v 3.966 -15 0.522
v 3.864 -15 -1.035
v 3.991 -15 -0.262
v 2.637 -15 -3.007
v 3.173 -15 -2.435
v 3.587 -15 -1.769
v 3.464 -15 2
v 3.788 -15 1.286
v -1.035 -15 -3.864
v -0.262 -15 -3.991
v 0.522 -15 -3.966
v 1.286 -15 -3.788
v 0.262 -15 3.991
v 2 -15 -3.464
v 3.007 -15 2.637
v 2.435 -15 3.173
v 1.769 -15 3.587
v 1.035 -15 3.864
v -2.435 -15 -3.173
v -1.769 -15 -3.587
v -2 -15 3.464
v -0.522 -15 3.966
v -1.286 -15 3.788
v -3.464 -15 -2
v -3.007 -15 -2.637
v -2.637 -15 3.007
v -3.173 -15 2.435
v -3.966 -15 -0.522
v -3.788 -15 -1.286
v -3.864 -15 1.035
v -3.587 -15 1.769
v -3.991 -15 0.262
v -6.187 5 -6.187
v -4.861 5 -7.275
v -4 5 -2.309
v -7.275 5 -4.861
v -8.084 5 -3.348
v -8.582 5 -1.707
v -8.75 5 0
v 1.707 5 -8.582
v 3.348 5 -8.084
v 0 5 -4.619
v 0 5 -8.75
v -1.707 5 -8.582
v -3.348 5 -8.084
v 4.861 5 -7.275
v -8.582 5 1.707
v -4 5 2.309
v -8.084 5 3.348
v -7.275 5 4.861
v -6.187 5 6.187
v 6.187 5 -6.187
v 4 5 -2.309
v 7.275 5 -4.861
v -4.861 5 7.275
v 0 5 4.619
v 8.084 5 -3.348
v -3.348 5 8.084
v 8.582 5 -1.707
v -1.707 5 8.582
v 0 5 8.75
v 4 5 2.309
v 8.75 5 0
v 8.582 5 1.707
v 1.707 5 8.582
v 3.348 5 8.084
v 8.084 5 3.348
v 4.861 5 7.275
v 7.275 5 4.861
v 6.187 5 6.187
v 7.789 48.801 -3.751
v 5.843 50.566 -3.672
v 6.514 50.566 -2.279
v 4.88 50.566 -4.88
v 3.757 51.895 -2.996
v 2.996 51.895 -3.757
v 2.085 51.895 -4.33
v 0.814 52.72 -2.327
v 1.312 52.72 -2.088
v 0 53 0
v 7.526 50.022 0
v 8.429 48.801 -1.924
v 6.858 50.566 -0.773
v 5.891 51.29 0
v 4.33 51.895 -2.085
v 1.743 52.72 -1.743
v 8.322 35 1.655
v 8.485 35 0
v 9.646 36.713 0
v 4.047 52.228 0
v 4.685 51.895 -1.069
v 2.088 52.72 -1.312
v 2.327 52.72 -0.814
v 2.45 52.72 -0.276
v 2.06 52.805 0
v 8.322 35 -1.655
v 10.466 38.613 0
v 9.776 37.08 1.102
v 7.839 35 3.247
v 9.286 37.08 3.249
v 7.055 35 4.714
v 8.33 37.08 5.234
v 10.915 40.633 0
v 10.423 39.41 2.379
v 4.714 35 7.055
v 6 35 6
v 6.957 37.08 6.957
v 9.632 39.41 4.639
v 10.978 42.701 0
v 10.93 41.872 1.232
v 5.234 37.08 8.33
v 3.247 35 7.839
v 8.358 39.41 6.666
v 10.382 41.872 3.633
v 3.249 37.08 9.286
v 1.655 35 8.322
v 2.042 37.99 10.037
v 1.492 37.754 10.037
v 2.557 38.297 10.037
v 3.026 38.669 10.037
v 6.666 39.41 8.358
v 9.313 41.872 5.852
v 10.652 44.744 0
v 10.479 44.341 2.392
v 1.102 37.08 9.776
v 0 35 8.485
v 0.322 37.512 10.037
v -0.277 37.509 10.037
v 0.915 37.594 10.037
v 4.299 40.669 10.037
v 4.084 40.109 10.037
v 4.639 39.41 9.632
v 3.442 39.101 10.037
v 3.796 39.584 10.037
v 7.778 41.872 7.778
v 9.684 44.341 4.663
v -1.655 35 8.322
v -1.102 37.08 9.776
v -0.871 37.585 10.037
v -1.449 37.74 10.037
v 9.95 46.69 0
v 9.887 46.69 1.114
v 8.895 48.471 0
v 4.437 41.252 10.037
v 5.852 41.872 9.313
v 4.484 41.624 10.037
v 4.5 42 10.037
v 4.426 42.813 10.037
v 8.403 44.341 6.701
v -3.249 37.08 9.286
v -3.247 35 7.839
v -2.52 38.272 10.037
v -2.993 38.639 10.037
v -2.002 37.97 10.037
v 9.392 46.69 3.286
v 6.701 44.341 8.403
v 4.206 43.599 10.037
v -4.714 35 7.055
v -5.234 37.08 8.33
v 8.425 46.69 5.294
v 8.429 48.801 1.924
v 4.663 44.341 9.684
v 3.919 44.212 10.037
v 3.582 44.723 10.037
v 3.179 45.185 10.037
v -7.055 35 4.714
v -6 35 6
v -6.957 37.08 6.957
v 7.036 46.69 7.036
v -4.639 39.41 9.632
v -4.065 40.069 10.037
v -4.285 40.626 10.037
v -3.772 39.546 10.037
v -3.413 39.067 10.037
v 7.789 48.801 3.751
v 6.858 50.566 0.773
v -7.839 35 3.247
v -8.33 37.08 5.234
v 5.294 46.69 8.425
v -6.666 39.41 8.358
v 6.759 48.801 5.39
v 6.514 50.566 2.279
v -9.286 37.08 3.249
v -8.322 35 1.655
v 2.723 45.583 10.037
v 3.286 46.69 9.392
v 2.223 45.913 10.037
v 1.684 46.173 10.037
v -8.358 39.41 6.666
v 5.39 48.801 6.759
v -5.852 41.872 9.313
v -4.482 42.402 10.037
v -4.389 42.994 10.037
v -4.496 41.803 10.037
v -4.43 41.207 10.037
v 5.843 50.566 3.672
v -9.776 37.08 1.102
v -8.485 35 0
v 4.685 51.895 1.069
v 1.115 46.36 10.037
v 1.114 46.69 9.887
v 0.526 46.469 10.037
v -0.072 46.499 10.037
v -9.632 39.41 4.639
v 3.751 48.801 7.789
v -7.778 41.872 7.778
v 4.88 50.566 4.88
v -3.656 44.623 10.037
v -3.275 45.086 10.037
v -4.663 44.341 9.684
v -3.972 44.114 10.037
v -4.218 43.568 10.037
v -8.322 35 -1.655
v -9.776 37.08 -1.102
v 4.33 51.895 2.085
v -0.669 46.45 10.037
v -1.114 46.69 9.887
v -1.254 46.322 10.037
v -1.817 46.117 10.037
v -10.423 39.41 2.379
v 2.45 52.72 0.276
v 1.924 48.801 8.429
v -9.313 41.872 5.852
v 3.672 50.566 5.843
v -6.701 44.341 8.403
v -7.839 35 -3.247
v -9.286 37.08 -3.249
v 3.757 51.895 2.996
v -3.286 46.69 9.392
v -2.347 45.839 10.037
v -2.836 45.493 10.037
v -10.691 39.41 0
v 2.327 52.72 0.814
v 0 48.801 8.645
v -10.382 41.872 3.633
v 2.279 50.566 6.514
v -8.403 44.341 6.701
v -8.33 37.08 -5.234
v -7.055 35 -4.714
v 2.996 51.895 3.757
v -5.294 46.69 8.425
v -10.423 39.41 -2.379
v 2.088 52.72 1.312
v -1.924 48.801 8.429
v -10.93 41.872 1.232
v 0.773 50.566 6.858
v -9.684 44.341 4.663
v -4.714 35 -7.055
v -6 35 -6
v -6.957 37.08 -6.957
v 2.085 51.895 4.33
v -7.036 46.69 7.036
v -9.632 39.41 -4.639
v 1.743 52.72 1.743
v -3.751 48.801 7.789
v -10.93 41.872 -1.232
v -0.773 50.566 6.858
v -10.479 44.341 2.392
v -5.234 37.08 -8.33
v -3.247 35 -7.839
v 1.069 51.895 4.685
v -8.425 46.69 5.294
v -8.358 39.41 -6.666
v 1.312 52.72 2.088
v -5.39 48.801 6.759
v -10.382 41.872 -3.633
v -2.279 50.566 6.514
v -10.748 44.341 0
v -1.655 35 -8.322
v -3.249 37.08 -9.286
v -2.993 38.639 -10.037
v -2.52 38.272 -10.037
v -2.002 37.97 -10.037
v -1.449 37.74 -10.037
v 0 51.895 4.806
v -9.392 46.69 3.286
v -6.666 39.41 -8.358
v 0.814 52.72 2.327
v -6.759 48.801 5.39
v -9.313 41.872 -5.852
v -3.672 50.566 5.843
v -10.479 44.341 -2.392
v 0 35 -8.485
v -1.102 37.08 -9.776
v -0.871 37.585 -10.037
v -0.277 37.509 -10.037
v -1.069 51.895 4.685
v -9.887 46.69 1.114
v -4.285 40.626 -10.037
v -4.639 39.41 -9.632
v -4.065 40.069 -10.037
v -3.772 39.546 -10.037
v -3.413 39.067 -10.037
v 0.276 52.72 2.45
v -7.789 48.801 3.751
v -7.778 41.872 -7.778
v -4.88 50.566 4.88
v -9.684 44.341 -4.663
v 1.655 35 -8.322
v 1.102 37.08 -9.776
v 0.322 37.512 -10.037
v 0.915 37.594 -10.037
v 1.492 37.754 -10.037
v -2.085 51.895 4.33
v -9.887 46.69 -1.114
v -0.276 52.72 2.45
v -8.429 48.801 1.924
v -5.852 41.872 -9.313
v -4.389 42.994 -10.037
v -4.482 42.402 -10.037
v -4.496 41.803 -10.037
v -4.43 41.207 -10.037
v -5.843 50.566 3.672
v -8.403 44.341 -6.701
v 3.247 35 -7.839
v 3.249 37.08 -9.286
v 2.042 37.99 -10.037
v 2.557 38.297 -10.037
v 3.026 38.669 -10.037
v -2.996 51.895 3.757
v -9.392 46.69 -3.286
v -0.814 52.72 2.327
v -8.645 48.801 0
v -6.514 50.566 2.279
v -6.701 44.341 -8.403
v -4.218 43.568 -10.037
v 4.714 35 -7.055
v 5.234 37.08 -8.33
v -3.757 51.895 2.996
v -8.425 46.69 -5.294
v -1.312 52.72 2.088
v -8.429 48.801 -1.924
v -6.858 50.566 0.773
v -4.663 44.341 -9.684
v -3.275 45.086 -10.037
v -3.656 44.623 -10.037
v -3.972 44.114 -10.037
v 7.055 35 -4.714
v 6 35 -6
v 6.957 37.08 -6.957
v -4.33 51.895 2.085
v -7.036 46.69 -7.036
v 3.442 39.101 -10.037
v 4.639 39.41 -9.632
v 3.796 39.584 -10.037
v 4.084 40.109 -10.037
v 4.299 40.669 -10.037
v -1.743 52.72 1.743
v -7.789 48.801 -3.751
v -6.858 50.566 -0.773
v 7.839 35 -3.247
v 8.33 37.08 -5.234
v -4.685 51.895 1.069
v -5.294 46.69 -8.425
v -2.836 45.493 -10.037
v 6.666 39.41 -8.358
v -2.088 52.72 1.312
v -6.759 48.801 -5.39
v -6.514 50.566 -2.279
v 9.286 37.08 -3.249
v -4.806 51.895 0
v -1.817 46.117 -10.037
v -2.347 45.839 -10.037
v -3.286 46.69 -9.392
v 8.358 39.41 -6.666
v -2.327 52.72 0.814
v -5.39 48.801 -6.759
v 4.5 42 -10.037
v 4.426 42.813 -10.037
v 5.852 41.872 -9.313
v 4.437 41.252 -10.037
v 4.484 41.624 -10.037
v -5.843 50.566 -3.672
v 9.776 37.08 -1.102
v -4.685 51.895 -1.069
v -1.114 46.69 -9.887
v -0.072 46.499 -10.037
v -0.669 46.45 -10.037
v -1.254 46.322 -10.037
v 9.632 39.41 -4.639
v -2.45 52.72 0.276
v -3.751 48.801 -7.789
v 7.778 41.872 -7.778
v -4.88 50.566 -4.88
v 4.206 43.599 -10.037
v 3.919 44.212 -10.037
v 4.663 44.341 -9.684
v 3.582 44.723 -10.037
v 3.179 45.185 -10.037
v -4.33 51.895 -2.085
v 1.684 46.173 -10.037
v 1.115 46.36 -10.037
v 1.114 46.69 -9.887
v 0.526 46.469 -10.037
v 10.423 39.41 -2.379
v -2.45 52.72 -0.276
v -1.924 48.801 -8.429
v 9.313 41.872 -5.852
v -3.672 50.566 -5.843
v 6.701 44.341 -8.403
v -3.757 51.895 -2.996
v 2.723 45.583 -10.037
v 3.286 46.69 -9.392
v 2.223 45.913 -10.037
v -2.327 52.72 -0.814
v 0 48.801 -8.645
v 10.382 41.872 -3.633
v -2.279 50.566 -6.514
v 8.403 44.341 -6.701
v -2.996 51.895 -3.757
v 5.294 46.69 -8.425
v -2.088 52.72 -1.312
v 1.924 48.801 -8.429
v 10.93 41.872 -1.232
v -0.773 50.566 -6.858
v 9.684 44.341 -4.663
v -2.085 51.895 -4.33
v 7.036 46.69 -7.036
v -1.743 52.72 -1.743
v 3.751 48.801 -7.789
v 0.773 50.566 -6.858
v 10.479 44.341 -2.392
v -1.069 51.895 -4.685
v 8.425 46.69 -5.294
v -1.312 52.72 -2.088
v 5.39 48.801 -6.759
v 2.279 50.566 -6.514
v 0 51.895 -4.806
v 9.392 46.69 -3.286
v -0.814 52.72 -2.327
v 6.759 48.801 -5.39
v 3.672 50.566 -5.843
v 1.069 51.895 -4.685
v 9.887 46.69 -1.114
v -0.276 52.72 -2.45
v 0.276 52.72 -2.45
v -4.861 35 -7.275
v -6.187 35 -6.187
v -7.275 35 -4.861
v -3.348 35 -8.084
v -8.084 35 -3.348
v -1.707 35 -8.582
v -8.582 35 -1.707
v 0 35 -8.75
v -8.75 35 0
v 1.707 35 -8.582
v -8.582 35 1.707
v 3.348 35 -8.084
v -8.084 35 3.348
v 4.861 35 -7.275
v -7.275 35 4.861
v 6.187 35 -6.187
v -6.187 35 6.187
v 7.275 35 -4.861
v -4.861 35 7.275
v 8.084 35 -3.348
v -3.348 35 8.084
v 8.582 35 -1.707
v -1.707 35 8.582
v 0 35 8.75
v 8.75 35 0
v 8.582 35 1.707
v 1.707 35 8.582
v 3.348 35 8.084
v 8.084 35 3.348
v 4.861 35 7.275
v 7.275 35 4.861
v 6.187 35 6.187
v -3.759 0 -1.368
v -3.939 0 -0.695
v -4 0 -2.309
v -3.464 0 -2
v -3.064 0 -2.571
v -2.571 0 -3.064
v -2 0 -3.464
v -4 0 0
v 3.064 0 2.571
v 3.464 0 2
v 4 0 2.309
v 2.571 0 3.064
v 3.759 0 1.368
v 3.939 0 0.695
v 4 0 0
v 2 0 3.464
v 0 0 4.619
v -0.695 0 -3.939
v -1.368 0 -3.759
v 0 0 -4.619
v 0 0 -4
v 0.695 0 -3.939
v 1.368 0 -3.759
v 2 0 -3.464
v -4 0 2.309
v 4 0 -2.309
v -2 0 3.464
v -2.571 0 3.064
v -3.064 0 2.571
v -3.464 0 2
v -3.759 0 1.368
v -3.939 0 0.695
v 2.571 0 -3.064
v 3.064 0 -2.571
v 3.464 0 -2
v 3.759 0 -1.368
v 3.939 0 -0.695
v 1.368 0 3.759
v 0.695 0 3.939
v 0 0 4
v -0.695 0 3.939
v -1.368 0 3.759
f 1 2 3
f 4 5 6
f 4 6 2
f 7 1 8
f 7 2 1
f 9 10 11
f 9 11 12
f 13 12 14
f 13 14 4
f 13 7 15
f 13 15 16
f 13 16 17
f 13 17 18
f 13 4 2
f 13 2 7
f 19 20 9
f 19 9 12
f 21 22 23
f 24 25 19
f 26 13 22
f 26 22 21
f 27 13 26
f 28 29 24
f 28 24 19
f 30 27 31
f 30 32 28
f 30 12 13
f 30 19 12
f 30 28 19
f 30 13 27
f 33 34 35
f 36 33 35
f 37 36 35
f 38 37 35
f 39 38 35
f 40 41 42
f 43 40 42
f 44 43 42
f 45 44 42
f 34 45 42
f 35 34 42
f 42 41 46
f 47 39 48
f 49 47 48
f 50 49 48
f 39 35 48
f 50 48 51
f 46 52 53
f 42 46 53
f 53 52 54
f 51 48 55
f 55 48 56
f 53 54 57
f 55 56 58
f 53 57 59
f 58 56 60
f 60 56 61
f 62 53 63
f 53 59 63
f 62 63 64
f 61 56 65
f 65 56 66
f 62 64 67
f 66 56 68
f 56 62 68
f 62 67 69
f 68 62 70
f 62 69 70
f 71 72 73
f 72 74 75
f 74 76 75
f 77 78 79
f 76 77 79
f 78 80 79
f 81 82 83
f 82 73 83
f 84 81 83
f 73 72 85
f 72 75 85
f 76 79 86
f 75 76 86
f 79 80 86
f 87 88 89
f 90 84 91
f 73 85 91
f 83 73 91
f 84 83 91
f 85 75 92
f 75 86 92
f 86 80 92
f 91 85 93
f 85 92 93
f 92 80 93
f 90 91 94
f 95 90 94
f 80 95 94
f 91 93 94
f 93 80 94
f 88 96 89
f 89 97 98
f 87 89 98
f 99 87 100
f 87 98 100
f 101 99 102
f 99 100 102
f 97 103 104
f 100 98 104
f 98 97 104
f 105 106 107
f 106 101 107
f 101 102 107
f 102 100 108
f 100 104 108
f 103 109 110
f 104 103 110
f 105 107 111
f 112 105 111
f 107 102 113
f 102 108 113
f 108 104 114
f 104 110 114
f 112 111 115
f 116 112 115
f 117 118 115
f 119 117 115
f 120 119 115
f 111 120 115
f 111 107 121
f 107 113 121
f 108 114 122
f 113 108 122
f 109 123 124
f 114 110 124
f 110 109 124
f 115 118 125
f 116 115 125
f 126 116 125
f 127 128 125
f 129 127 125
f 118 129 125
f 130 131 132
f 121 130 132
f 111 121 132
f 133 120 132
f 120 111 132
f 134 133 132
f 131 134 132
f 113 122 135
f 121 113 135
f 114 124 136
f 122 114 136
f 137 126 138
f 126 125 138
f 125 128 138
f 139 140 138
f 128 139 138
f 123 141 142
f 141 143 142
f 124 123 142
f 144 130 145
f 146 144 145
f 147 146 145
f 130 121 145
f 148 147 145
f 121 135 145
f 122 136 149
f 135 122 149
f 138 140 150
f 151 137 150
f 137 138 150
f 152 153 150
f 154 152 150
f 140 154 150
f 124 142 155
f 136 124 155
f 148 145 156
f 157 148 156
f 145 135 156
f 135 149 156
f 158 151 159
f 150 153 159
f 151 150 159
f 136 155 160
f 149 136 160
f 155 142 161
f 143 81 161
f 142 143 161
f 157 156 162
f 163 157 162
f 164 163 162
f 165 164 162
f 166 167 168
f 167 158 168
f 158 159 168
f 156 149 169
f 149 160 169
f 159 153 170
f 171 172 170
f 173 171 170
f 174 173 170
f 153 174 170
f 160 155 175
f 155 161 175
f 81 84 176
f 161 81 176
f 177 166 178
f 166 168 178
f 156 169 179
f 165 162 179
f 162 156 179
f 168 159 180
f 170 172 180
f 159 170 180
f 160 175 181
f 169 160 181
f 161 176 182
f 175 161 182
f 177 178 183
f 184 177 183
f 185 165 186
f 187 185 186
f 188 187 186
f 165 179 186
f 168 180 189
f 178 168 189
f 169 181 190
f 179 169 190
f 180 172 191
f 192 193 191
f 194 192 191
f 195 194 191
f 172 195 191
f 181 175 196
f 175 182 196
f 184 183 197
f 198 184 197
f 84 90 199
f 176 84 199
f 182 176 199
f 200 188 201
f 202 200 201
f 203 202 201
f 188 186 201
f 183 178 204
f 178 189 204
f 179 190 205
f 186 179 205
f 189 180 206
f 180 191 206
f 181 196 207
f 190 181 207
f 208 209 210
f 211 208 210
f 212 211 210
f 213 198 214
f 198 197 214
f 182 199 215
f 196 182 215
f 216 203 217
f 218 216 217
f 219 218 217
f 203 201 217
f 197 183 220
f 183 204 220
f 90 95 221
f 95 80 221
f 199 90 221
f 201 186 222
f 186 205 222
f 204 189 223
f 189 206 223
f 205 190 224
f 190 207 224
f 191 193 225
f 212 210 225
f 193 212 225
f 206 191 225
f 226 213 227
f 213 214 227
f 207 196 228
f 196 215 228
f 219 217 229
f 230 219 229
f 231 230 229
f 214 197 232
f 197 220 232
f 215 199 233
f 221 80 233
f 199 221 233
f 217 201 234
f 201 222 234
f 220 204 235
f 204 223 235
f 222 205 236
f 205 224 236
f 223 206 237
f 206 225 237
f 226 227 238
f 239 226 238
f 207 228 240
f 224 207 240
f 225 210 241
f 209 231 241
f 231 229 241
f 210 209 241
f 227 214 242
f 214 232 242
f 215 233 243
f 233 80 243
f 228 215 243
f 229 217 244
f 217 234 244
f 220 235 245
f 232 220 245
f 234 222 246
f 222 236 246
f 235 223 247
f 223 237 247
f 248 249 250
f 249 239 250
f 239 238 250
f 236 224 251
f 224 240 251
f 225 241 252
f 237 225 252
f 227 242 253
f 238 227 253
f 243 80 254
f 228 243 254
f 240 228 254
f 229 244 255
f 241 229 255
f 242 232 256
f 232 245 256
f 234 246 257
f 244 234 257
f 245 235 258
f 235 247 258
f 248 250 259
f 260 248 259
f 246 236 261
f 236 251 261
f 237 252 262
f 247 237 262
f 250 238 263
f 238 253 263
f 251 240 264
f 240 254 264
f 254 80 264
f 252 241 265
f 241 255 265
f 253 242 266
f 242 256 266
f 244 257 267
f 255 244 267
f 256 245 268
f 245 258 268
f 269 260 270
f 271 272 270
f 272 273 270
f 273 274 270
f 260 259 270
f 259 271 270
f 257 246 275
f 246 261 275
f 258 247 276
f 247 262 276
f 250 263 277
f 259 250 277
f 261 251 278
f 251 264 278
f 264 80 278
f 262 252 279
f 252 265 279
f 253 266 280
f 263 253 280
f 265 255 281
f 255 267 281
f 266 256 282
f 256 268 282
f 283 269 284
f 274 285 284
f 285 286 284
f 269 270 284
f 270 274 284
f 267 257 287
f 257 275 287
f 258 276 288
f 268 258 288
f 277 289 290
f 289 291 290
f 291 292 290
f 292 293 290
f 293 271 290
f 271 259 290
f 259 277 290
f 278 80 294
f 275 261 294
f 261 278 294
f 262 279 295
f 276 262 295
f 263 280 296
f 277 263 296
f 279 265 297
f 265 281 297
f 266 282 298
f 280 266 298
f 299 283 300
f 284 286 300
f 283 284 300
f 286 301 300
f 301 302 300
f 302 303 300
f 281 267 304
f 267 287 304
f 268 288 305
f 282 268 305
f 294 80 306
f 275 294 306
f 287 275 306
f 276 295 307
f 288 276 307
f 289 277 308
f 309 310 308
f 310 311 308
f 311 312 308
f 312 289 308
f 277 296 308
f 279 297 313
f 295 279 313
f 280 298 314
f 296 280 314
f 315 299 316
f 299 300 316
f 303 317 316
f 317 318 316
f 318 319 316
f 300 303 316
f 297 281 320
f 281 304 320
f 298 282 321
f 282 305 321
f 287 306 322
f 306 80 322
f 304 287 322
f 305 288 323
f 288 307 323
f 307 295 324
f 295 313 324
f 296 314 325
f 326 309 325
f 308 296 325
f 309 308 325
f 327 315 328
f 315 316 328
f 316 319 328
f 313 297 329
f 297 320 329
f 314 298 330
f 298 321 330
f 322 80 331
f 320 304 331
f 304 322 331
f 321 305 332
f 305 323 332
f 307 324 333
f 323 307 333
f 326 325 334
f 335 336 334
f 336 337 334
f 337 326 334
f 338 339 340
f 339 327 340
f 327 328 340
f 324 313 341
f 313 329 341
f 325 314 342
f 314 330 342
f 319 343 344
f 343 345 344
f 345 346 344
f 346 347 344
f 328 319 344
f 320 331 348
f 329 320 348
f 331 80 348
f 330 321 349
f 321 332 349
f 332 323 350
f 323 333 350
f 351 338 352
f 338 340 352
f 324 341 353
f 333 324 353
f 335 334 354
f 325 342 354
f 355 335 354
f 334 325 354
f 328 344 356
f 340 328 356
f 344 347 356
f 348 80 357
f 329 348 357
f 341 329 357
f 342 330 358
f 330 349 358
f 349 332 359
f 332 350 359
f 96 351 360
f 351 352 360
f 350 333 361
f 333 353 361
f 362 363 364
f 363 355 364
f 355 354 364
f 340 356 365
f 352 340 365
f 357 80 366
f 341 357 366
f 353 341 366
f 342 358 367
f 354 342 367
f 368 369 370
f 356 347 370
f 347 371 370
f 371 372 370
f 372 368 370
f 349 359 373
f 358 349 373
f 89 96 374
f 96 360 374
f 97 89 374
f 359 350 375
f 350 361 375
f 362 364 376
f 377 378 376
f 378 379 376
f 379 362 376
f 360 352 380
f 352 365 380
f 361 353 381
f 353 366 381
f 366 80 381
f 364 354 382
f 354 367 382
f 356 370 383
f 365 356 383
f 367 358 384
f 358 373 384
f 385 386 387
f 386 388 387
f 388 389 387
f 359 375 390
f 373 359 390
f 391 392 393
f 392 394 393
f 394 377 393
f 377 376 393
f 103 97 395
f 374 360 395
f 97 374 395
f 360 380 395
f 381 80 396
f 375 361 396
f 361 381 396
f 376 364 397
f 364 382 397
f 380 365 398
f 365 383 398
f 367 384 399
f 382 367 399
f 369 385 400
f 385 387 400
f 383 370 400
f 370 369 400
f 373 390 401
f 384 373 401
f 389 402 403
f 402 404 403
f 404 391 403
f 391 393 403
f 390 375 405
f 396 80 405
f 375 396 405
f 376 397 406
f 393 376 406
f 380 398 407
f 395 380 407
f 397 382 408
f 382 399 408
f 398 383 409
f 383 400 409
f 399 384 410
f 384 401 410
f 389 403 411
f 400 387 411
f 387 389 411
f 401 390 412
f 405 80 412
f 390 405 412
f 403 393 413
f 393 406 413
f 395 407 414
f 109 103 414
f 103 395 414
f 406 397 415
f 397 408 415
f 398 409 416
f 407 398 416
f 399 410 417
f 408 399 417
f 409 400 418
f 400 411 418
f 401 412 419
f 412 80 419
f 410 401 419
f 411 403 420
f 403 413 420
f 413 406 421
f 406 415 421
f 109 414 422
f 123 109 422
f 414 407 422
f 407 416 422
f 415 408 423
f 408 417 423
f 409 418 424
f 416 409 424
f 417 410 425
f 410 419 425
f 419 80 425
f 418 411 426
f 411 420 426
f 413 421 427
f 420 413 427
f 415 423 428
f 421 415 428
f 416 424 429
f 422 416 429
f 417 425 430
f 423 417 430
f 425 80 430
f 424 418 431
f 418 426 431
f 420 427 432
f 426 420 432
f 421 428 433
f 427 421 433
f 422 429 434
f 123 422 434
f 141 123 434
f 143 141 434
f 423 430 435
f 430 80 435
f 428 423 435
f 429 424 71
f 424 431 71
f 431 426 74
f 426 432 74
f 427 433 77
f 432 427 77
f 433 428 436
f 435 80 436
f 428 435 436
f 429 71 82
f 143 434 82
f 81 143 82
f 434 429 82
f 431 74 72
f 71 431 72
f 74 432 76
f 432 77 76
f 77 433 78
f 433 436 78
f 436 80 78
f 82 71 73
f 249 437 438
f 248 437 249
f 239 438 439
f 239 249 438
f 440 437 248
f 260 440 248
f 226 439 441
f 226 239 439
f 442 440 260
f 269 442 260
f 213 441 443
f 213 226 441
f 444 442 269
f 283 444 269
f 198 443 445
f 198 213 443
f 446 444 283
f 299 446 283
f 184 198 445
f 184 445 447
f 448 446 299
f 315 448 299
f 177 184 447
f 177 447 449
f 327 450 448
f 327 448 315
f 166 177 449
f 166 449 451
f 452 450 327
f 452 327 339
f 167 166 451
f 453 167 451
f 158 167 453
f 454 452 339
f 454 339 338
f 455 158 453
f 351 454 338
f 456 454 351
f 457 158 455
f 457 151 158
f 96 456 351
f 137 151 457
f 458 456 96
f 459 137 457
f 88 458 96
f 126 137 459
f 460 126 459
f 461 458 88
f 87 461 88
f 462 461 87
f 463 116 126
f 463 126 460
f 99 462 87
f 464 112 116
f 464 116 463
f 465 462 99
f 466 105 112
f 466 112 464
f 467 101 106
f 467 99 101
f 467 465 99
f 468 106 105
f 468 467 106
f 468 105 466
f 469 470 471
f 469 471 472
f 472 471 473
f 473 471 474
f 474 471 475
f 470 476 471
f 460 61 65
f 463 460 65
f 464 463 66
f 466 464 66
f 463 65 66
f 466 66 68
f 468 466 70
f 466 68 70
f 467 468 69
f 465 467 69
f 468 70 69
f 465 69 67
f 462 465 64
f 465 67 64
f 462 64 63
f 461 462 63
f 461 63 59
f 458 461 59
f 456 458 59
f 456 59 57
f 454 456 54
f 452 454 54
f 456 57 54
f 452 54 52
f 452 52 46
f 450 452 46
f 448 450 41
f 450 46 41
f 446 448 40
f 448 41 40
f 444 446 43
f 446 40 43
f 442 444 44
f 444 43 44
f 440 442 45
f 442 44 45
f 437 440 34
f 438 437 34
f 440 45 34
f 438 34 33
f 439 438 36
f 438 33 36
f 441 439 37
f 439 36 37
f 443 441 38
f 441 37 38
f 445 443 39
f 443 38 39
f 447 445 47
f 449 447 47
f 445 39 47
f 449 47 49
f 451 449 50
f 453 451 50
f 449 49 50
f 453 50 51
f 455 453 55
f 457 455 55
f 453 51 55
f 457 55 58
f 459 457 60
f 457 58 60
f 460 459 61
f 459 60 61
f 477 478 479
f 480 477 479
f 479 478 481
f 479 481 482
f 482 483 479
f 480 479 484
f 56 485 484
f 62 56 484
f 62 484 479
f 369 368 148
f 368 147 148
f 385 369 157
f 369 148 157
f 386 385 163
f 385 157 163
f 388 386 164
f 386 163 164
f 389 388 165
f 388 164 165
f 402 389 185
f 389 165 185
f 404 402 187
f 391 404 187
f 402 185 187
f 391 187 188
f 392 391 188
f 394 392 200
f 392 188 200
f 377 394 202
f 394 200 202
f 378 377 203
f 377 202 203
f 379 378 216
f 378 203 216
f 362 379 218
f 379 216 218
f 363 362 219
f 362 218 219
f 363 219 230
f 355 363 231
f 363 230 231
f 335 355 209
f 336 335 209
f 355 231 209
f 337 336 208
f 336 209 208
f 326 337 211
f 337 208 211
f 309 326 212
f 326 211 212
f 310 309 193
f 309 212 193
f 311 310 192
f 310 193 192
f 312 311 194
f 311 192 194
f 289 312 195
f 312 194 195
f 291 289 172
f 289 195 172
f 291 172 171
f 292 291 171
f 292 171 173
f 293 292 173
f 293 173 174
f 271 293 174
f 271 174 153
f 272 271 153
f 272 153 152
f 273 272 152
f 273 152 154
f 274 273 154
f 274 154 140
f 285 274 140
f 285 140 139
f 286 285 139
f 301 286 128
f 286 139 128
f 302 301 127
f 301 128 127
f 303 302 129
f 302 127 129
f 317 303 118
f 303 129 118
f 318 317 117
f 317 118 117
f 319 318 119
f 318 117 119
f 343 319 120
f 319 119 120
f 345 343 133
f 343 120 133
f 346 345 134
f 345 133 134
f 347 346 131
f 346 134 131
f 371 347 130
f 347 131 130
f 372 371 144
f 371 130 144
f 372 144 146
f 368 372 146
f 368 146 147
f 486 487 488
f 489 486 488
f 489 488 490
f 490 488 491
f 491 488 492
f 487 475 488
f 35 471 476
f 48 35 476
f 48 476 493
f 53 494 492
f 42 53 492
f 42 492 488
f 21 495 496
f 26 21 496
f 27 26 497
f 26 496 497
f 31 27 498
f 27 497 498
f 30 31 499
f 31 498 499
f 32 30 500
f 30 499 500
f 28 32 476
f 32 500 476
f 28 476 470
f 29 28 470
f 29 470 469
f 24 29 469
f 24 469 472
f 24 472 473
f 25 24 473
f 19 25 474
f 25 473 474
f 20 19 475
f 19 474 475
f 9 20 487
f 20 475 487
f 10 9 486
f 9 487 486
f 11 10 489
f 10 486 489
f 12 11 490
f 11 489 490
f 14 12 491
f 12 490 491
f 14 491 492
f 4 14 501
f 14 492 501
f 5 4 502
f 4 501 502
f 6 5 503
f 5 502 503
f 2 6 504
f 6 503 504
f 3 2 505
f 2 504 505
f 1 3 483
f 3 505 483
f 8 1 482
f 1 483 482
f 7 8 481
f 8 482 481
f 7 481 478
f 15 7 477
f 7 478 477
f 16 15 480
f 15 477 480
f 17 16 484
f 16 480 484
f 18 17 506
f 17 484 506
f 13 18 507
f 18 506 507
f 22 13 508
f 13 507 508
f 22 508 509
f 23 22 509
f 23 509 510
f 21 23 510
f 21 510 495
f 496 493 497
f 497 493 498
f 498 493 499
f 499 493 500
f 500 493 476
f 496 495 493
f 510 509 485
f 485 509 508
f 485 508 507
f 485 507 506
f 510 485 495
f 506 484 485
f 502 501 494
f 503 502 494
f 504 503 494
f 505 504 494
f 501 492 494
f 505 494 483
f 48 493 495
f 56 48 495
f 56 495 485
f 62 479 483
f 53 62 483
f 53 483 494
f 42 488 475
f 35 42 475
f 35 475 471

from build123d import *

# Parameters (mm, degrees)
EXTRUDE_1_DEPTH     = 5
SKETCH_2_R          = 8.75
EXTRUDE_2_DEPTH     = 30
SKETCH_4_R          = 4.5
CUT_EXTRUDE_1_DEPTH = 25
SKETCH_5_R          = 4
EXTRUDE_3_DEPTH     = 15


with BuildPart() as part:
    # 草图1 → 凸台-拉伸1 (new body)
    with BuildSketch(Plane(origin=(0, 0, 0), x_dir=(1, 0, 0), z_dir=(0, 1, 0))):
        Polygon((0, 4.618802154), (-4, 2.309401077), (-4, -2.309401077), (0, -4.618802154), (4, -2.309401077), (4, 2.309401077), align=None)
    extrude(amount=EXTRUDE_1_DEPTH)

    # 草图2 → 凸台-拉伸2 (add)
    with BuildSketch(Plane(origin=(0, 5, 0), x_dir=(1, 0, 0), z_dir=(0, 1, 0))):
        with Locations(Location((0, 0, 0), (0, 0, 270))):
            Circle(SKETCH_2_R)
    extrude(amount=EXTRUDE_2_DEPTH)

    # 草图3 → 旋转1 (revolve)
    with BuildSketch(Plane.XY):
        with BuildLine():
            ThreePointArc((0, 31), (11, 42), (0, 53))
            Line((0, 53), (0, 31))
        make_face()
    revolve(axis=Axis((0, 53, 0), (0, -1, 0)))

    # 草图4 → 切除-拉伸1 (cut, symmetric)
    with BuildSketch(Plane.XY):
        with Locations((0, 42)):
            Circle(SKETCH_4_R)
    extrude(amount=CUT_EXTRUDE_1_DEPTH, both=True, mode=Mode.SUBTRACT)

    # 草图5 → 凸台-拉伸3 (add)
    with BuildSketch(Plane.XZ):
        with Locations(Location((0, 0, 0), (0, 0, 120))):
            Circle(SKETCH_5_R)
    extrude(amount=EXTRUDE_3_DEPTH)


solid = part.part
